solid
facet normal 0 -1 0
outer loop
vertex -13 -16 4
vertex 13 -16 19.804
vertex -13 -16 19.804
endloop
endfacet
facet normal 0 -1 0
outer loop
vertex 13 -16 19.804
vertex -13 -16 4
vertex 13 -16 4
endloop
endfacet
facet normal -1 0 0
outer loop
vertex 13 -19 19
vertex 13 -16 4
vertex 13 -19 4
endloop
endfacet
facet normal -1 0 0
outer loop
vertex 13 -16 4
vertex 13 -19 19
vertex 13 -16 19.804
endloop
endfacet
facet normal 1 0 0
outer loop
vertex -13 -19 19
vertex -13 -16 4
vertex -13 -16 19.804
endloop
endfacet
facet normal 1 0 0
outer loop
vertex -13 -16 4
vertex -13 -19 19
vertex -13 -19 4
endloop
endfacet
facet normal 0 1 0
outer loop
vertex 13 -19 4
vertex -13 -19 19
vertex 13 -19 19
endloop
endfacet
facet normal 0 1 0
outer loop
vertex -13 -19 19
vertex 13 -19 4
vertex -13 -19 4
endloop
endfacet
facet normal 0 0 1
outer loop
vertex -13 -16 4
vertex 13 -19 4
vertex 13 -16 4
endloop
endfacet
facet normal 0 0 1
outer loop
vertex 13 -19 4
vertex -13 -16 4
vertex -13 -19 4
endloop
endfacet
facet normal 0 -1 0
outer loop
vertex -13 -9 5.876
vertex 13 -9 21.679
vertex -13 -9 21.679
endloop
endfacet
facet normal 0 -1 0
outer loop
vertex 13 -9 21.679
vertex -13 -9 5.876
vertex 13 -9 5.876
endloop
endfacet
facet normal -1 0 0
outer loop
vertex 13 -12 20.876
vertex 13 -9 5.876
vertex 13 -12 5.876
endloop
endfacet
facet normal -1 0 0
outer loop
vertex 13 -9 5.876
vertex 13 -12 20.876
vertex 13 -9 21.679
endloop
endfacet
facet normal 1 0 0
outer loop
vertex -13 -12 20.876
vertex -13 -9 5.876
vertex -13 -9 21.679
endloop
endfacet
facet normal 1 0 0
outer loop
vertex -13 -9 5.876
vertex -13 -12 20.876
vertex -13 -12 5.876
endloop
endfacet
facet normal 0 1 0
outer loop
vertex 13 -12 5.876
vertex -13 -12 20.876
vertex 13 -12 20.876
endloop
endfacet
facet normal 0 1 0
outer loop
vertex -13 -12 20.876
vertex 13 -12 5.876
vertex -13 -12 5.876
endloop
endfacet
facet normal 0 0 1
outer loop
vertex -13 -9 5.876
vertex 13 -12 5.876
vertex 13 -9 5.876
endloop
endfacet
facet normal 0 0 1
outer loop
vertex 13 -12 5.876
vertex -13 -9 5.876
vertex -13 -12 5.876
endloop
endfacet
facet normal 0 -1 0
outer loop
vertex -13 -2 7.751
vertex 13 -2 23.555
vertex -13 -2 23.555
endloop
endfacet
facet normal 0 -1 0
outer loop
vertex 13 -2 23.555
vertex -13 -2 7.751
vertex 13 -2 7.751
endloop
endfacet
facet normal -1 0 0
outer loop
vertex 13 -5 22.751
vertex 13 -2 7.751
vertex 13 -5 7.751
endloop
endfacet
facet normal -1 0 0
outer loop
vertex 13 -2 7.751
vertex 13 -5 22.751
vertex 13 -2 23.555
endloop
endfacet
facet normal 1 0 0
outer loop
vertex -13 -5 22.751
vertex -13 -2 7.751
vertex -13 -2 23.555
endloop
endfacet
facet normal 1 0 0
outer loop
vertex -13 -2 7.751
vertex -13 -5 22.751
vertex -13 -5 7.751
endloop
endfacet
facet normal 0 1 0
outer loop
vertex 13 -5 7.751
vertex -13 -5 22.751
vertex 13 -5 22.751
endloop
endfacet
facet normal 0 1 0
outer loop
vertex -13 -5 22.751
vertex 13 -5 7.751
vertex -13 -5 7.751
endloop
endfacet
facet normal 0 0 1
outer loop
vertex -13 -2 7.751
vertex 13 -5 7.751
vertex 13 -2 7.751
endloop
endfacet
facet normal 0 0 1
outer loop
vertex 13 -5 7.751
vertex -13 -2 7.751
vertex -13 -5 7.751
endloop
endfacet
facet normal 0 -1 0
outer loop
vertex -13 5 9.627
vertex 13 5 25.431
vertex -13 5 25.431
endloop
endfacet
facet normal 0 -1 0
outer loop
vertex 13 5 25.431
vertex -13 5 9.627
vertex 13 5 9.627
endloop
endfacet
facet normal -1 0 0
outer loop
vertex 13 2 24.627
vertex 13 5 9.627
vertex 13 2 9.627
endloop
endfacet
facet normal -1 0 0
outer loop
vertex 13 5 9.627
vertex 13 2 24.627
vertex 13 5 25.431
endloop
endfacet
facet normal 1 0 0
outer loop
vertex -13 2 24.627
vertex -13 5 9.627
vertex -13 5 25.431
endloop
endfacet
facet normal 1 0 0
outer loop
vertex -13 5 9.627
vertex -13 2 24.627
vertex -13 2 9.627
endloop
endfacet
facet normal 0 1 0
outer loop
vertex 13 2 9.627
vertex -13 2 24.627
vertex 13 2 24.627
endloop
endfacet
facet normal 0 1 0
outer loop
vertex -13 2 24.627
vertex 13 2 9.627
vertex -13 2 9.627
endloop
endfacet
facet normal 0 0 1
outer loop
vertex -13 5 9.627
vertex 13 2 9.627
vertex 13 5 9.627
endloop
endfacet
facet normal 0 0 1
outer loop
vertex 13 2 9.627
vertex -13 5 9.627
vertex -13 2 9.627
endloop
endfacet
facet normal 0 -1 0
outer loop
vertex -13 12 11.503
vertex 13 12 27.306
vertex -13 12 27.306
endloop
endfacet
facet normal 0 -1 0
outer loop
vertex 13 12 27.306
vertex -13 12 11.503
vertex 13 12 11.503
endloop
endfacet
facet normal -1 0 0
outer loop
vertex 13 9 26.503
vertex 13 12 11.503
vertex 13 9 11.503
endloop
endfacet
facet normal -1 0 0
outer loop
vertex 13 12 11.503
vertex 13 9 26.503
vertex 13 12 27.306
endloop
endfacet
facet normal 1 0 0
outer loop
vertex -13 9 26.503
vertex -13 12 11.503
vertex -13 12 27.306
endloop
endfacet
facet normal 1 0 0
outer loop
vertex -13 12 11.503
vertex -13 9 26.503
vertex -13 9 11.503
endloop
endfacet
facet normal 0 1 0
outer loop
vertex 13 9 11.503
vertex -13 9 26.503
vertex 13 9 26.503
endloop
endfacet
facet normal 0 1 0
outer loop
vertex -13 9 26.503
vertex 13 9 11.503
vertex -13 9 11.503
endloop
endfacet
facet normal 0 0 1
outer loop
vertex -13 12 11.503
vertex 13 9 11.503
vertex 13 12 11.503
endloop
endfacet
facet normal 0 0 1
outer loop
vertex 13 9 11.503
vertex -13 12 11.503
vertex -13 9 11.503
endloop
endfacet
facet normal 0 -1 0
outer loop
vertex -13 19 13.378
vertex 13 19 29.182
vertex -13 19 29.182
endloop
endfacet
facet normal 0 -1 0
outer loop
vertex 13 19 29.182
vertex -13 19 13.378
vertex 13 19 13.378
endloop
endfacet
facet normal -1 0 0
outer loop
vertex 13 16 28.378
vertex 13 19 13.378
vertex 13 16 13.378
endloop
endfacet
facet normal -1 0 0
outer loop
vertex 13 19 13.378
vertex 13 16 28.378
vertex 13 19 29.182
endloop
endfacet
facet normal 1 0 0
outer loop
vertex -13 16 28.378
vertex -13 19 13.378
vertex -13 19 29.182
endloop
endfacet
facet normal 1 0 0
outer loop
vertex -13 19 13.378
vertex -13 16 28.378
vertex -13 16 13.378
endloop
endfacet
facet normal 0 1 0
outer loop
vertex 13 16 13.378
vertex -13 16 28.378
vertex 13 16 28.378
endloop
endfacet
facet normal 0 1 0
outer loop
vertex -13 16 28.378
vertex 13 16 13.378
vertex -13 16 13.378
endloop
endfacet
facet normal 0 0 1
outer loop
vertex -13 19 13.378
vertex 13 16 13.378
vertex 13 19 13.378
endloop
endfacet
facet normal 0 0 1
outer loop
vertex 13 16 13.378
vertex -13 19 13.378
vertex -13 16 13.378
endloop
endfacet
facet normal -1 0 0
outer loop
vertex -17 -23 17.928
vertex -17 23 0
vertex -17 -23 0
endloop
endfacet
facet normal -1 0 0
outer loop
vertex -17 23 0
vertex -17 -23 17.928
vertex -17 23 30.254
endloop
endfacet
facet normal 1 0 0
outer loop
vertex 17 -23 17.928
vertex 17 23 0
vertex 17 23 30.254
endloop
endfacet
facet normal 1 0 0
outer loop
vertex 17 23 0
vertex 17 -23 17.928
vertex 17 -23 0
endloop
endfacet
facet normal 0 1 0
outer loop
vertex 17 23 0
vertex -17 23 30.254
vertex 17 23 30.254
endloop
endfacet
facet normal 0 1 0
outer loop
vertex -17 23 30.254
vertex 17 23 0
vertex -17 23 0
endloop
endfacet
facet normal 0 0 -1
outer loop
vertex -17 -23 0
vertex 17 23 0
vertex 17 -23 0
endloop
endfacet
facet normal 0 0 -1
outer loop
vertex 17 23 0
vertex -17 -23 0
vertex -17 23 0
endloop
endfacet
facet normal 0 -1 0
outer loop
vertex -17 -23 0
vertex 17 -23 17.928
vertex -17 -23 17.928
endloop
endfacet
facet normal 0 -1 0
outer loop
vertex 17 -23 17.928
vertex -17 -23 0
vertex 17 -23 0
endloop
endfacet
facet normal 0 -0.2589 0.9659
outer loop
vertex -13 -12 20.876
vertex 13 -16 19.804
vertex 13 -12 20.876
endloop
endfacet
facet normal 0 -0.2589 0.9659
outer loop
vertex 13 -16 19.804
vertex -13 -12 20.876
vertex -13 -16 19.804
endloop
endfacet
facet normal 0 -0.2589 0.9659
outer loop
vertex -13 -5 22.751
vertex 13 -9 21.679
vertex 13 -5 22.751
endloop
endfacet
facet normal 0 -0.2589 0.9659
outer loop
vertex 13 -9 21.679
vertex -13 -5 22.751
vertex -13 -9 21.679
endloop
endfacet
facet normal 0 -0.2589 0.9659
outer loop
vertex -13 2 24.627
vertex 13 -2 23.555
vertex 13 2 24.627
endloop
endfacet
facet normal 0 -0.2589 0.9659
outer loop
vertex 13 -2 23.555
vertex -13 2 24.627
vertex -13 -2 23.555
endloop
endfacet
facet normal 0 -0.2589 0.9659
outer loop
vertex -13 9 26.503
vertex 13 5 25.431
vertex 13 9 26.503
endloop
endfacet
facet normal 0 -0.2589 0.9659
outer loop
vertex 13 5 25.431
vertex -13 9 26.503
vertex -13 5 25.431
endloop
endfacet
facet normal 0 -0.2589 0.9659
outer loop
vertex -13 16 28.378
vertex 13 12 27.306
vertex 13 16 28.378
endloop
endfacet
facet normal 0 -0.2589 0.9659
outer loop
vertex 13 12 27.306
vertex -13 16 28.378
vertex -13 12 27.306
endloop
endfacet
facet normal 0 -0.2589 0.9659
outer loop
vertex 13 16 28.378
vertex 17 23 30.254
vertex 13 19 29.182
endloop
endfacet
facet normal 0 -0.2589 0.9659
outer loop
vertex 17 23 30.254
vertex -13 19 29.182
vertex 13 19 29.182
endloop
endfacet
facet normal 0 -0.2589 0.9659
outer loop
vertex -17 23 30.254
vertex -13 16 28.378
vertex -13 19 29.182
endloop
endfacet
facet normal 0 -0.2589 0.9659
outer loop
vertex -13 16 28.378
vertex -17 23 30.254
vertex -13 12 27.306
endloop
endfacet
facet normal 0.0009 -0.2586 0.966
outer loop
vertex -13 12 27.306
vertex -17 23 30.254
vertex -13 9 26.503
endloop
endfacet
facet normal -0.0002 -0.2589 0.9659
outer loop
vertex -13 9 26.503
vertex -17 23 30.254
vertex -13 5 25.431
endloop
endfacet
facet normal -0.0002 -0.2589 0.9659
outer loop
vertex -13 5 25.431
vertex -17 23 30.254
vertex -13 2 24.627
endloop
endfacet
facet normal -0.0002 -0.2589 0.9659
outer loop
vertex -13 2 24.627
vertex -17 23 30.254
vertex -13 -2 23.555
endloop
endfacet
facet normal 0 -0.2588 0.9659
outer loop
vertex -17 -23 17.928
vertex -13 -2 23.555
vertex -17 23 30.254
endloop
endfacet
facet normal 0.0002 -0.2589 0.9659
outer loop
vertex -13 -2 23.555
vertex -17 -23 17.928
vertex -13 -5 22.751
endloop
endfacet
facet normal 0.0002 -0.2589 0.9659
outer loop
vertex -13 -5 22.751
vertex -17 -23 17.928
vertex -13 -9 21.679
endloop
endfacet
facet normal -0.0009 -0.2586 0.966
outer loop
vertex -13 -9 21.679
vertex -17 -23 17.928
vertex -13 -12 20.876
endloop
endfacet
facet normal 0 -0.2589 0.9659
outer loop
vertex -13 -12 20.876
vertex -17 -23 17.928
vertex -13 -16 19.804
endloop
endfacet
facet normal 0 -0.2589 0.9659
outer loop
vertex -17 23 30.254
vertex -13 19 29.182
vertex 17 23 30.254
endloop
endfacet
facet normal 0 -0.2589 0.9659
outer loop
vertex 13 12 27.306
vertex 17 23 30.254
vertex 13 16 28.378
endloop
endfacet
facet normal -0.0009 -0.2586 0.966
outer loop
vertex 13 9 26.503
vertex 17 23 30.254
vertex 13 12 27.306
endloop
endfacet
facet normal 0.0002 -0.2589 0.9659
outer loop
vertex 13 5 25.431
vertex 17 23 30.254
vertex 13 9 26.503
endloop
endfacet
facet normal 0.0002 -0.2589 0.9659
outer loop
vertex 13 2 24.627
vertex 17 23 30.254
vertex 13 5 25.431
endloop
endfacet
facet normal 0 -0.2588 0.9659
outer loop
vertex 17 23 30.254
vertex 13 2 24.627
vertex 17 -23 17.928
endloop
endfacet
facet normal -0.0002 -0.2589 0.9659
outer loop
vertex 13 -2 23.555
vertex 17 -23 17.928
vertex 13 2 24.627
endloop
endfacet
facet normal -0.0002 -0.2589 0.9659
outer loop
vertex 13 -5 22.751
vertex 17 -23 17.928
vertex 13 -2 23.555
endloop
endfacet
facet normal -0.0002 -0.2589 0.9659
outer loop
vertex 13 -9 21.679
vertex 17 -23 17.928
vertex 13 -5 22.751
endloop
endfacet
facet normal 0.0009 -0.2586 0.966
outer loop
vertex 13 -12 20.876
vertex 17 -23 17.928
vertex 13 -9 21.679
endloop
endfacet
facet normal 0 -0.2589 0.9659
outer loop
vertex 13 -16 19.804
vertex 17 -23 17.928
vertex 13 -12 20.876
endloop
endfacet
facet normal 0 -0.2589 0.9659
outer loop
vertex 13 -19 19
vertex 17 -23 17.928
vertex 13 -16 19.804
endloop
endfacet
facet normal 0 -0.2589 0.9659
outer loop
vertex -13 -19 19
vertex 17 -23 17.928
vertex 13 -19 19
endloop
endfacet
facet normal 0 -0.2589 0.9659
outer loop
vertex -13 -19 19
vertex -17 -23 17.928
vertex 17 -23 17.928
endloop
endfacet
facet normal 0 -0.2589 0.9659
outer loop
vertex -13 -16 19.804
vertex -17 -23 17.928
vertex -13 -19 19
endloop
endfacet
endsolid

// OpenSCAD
// [FL_INDEX: keywords="openscad, 3d_parametric, Parametric_SD_Card_Holder, csg_solid" | COT="Parametric OpenSCAD design from 3DCodeverse"]
// Title: Parametric SD Card Holder

// Parameterized SD card holder, PAmes
//
// Published at:
//    http://www.thingiverse.com/thing:15323
//
// Derivative of http://www.thingiverse.com/thing:9218 by jpcw
//
// Can adjust the number of slots, and the slot size

// The slot, of course, should be a little larger than the card.
// Adjust for desired fit.  I use these numbers on my TOM/Mk7,
// which give a slightly loose fit (the cards will fall out easily
// if turned over).  If you want to adjust the slot size, try
// experimenting by setting 'slots' to 1.
// All units are mm.

slots = 6;  // As many or as few as you want
slotWidth = 26;
slotThickness = 3; // front to back
slotSeparation = 4;  // Barrier between slots
slotDepth = 15; // This much of the card fits into the slot, half of the card height seems about right.
topRiseAngle = 15; // degrees


// These should be OK as is.  Adjust if you want wider borders.
bottomHeight = slotSeparation; // bottom of first hole to bottom of holder
sideWidth    = slotSeparation; // left, right borders
frontDepth   = slotSeparation; // front to first hole
backDepth    = slotSeparation; // back to last hole


// Shouldn't have to mess with these.
holderWidth = slotWidth + 2*sideWidth;
holderFrontHeight = slotDepth + bottomHeight - tan(topRiseAngle)*frontDepth;
holderDepth = frontDepth + slotThickness*slots +
            slotSeparation*(slots-1) + backDepth;
holderBackHeight = holderFrontHeight + tan(topRiseAngle)*holderDepth;

module basicBlock() {
  linear_extrude(height=holderWidth, convexity=2)
    polygon(points = [ [0, 0],
                     [holderDepth, 0],
                     [holderDepth, holderBackHeight],
                     [0, holderFrontHeight] ]);
}

// One slot, at first location
module slot() {
  translate([frontDepth, bottomHeight,0])
    translate([0,0,sideWidth])
      cube(size=[slotThickness, holderBackHeight, slotWidth]); // sticks up, used by difference()
}

// Makes all slots
module slots() {
  for (i = [0 : slots-1]) {
    translate([i*(slotSeparation+slotThickness), i*tan(topRiseAngle)*(slotSeparation+slotThickness), 0])
      slot();
  }
}

// Put it all together
module SDCardHolder() {
  // Place into nice orientation
  rotate([0,0,90])
    translate([-holderDepth/2,holderWidth/2,0])
      rotate([90,0,0])
        difference() {
          basicBlock();
          slots();
        }
}

SDCardHolder();
